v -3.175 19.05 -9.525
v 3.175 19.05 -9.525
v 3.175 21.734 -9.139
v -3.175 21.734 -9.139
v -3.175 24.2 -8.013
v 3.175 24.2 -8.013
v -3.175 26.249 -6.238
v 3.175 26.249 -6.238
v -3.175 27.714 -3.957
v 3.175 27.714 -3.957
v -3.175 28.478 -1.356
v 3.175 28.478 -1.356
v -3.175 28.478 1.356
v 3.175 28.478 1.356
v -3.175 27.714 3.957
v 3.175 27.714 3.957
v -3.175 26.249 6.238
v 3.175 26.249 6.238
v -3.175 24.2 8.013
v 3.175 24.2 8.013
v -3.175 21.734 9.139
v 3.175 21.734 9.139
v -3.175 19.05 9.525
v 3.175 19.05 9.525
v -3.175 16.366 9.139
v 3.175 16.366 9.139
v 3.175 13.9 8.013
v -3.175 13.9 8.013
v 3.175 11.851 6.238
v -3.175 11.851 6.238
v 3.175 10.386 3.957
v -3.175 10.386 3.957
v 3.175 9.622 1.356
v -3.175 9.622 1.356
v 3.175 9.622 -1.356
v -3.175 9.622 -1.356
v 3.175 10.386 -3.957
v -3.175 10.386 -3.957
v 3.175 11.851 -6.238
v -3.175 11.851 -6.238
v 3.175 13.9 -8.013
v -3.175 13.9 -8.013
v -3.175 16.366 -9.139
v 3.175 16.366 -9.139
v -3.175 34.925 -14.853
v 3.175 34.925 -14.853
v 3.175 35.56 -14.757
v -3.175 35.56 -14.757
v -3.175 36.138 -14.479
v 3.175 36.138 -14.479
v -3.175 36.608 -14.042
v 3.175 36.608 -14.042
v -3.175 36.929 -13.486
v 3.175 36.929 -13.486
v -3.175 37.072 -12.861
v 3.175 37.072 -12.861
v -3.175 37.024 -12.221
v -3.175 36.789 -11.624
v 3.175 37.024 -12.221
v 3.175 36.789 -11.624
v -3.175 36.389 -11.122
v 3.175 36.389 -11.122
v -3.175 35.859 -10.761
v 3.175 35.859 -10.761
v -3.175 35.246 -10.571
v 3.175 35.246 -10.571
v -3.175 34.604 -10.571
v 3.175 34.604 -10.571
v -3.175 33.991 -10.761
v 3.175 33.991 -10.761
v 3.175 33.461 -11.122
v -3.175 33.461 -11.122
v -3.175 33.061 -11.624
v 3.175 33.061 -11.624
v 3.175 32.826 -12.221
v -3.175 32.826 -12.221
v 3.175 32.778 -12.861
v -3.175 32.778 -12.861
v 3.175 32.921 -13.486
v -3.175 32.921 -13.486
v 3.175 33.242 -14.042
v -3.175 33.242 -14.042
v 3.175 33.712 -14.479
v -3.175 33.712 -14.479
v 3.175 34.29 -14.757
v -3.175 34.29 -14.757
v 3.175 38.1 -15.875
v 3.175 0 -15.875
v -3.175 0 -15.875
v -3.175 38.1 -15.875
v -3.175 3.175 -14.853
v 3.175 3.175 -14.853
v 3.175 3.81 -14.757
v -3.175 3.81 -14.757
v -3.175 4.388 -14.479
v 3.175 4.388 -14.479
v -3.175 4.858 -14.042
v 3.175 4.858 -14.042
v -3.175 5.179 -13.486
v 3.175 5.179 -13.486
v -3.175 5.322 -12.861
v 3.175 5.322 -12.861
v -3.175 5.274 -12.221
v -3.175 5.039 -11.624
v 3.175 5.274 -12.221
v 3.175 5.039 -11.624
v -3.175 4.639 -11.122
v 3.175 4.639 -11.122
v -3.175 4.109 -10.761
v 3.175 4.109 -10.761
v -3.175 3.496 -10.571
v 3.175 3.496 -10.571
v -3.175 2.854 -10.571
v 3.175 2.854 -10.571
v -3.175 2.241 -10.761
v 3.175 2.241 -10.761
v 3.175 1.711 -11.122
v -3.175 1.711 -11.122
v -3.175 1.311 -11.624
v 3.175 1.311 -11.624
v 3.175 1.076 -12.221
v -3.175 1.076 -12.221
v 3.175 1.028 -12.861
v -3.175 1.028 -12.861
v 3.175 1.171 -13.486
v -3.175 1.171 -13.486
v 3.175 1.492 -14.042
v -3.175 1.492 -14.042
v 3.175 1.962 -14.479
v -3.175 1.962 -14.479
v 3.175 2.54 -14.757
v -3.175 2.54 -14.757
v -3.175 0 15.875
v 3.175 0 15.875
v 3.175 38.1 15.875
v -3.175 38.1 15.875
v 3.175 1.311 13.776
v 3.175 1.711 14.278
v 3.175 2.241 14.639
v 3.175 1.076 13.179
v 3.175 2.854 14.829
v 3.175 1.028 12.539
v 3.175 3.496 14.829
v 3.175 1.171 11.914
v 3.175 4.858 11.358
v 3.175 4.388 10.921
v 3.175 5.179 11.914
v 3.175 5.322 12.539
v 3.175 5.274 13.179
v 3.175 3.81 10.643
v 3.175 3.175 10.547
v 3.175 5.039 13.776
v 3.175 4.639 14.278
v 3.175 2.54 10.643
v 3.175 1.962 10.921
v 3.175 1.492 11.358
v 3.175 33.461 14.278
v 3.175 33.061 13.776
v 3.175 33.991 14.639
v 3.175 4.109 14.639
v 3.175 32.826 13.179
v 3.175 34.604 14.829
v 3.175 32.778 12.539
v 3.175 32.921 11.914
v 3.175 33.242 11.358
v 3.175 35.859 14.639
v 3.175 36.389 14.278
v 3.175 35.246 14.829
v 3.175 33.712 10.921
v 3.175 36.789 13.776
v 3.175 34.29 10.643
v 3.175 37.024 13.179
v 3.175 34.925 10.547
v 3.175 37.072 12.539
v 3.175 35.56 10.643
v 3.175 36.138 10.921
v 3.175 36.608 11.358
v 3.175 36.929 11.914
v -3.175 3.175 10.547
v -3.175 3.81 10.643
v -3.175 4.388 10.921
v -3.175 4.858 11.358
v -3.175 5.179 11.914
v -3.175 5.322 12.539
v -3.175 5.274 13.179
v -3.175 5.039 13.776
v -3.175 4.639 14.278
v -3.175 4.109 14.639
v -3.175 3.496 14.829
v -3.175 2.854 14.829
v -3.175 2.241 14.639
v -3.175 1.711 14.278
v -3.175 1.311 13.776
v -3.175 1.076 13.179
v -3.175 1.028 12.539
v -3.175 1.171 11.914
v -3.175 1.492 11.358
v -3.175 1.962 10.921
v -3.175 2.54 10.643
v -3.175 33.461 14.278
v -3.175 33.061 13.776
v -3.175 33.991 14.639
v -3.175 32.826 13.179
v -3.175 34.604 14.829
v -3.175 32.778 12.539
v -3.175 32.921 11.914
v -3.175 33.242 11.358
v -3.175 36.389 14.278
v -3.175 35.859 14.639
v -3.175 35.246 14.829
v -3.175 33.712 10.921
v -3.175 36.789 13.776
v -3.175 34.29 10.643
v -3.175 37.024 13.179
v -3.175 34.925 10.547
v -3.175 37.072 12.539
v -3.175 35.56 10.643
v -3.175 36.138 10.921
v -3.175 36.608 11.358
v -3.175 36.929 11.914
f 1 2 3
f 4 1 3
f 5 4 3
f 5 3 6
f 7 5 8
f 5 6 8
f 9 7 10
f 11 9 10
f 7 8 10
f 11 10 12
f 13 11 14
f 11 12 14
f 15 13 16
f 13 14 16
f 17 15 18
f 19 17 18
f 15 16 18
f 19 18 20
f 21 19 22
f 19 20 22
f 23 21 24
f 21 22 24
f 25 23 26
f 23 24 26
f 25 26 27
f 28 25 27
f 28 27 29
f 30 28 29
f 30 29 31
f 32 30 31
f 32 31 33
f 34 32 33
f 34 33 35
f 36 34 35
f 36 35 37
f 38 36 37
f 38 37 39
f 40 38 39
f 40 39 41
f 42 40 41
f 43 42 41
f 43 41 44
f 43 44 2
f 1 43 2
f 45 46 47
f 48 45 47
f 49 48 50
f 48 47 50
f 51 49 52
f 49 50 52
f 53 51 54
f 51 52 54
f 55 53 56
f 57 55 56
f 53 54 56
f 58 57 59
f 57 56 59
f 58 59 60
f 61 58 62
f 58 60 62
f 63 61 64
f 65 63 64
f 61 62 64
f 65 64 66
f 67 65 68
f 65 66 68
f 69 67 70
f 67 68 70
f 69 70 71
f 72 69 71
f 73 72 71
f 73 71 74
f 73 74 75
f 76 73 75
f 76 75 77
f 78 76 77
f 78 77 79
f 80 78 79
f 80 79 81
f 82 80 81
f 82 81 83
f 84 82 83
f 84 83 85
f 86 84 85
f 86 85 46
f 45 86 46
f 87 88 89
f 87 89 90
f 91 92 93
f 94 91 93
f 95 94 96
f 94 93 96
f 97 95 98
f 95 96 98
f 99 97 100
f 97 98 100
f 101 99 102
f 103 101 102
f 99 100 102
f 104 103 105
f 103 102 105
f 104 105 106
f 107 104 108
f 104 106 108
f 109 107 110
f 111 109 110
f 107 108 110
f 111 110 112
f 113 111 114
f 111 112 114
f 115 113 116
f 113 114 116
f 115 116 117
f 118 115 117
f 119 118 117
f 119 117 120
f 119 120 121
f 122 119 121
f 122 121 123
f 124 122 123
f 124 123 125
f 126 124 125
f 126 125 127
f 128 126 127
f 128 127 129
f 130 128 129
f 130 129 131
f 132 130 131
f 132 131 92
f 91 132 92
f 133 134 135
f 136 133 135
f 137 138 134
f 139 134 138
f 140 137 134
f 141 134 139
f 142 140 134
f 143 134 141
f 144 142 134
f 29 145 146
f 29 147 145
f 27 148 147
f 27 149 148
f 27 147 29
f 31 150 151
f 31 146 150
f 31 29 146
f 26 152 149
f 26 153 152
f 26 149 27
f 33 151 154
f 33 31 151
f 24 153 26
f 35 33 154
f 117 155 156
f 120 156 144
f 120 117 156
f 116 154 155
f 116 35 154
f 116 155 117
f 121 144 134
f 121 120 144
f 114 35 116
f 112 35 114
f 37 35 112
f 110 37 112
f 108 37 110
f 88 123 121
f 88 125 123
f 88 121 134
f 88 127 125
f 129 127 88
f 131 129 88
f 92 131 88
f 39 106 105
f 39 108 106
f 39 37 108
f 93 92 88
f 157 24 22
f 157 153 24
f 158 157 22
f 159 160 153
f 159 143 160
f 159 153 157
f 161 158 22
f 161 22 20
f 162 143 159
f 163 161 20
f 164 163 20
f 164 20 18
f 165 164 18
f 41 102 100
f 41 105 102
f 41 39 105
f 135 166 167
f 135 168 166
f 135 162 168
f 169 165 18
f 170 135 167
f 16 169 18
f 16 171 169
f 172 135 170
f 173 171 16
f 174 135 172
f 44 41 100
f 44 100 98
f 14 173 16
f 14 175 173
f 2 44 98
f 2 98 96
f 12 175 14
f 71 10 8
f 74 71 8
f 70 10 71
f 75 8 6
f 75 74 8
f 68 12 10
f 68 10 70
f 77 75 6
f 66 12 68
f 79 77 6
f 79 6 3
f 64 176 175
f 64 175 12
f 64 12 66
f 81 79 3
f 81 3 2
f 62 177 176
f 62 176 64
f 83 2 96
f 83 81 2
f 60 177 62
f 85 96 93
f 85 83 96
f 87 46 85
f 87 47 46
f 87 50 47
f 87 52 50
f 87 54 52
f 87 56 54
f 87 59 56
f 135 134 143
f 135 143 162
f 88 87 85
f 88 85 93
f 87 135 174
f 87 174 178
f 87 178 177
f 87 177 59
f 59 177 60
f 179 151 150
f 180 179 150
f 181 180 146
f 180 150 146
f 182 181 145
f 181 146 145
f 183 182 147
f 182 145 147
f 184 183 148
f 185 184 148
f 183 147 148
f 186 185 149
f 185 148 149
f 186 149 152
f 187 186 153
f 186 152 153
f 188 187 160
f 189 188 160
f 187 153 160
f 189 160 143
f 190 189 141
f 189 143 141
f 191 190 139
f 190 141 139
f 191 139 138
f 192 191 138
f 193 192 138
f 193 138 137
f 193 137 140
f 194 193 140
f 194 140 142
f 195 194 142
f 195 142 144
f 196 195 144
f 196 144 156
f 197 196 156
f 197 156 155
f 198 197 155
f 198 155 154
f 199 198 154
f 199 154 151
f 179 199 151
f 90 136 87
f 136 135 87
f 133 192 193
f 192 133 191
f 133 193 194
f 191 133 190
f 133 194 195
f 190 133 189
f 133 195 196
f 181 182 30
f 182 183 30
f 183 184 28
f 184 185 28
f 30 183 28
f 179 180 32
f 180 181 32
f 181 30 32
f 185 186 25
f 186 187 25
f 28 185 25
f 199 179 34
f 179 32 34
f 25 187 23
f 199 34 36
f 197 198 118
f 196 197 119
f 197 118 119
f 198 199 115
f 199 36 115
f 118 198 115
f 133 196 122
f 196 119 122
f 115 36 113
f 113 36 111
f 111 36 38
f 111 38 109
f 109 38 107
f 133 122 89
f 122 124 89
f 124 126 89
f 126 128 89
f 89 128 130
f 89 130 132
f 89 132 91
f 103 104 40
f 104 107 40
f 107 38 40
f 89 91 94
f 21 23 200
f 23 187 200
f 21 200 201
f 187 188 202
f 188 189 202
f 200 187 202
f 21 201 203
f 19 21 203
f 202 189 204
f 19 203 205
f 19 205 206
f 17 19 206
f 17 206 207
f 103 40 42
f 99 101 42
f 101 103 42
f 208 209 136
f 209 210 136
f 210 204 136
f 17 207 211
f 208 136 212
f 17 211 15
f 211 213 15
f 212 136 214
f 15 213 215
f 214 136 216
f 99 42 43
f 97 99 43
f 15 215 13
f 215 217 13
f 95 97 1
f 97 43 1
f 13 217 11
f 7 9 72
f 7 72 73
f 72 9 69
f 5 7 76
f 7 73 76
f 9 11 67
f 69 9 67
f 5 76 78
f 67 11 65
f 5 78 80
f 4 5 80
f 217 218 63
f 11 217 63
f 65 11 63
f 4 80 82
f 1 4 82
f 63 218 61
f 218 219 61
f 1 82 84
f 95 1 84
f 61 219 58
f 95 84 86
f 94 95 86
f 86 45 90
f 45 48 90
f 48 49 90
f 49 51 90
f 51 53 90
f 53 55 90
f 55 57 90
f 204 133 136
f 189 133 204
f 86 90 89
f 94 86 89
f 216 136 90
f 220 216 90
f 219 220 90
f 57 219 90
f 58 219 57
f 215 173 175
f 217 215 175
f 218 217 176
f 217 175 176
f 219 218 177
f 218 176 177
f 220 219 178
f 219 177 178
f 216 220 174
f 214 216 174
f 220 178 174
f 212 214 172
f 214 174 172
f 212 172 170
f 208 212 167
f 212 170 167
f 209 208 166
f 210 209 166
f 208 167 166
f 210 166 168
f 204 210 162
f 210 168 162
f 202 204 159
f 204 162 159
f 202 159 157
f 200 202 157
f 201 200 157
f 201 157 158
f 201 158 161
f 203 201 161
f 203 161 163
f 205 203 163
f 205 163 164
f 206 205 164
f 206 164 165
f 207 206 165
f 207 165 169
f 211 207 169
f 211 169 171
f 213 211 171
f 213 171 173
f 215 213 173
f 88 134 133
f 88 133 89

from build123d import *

# Parameters (mm, degrees)
SKETCH1_W           = 31.75
SKETCH1_H           = 38.1
BOSS_EXTRUDE1_DEPTH = 3.175
SKETCH2_R           = 2.15265
CUT_EXTRUDE1_DEPTH  = 42.760604941
SKETCH3_R           = 9.525
CUT_EXTRUDE2_DEPTH  = 42.760604941


with BuildPart() as part:
    # Sketch1 → Boss-Extrude1 (new, symmetric)
    with BuildSketch(Plane(origin=(0, 0, 0), x_dir=(0, 0, -1), z_dir=(1, 0, 0))):
        with Locations((0, 19.05)):
            Rectangle(SKETCH1_W, SKETCH1_H)
    extrude(amount=BOSS_EXTRUDE1_DEPTH, both=True)

    # Sketch2 → Cut-Extrude1 (cut, through all)
    with BuildSketch(Plane(origin=(3.175, 0, 0), x_dir=(0, 0, -1), z_dir=(1, 0, 0))):
        with Locations((-12.7, 3.175)):
            Circle(SKETCH2_R)
        with Locations((-12.7, 34.925)):
            Circle(SKETCH2_R)
        with Locations((12.7, 3.175)):
            Circle(SKETCH2_R)
        with Locations((12.7, 34.925)):
            Circle(SKETCH2_R)
    extrude(amount=-CUT_EXTRUDE1_DEPTH, mode=Mode.SUBTRACT)

    # Sketch3 → Cut-Extrude2 (cut, through all)
    with BuildSketch(Plane(origin=(3.175, 0, 0), x_dir=(0, 0, -1), z_dir=(1, 0, 0))):
        with Locations((0, 19.05)):
            Circle(SKETCH3_R)
    extrude(amount=-CUT_EXTRUDE2_DEPTH, mode=Mode.SUBTRACT)


solid = part.part
